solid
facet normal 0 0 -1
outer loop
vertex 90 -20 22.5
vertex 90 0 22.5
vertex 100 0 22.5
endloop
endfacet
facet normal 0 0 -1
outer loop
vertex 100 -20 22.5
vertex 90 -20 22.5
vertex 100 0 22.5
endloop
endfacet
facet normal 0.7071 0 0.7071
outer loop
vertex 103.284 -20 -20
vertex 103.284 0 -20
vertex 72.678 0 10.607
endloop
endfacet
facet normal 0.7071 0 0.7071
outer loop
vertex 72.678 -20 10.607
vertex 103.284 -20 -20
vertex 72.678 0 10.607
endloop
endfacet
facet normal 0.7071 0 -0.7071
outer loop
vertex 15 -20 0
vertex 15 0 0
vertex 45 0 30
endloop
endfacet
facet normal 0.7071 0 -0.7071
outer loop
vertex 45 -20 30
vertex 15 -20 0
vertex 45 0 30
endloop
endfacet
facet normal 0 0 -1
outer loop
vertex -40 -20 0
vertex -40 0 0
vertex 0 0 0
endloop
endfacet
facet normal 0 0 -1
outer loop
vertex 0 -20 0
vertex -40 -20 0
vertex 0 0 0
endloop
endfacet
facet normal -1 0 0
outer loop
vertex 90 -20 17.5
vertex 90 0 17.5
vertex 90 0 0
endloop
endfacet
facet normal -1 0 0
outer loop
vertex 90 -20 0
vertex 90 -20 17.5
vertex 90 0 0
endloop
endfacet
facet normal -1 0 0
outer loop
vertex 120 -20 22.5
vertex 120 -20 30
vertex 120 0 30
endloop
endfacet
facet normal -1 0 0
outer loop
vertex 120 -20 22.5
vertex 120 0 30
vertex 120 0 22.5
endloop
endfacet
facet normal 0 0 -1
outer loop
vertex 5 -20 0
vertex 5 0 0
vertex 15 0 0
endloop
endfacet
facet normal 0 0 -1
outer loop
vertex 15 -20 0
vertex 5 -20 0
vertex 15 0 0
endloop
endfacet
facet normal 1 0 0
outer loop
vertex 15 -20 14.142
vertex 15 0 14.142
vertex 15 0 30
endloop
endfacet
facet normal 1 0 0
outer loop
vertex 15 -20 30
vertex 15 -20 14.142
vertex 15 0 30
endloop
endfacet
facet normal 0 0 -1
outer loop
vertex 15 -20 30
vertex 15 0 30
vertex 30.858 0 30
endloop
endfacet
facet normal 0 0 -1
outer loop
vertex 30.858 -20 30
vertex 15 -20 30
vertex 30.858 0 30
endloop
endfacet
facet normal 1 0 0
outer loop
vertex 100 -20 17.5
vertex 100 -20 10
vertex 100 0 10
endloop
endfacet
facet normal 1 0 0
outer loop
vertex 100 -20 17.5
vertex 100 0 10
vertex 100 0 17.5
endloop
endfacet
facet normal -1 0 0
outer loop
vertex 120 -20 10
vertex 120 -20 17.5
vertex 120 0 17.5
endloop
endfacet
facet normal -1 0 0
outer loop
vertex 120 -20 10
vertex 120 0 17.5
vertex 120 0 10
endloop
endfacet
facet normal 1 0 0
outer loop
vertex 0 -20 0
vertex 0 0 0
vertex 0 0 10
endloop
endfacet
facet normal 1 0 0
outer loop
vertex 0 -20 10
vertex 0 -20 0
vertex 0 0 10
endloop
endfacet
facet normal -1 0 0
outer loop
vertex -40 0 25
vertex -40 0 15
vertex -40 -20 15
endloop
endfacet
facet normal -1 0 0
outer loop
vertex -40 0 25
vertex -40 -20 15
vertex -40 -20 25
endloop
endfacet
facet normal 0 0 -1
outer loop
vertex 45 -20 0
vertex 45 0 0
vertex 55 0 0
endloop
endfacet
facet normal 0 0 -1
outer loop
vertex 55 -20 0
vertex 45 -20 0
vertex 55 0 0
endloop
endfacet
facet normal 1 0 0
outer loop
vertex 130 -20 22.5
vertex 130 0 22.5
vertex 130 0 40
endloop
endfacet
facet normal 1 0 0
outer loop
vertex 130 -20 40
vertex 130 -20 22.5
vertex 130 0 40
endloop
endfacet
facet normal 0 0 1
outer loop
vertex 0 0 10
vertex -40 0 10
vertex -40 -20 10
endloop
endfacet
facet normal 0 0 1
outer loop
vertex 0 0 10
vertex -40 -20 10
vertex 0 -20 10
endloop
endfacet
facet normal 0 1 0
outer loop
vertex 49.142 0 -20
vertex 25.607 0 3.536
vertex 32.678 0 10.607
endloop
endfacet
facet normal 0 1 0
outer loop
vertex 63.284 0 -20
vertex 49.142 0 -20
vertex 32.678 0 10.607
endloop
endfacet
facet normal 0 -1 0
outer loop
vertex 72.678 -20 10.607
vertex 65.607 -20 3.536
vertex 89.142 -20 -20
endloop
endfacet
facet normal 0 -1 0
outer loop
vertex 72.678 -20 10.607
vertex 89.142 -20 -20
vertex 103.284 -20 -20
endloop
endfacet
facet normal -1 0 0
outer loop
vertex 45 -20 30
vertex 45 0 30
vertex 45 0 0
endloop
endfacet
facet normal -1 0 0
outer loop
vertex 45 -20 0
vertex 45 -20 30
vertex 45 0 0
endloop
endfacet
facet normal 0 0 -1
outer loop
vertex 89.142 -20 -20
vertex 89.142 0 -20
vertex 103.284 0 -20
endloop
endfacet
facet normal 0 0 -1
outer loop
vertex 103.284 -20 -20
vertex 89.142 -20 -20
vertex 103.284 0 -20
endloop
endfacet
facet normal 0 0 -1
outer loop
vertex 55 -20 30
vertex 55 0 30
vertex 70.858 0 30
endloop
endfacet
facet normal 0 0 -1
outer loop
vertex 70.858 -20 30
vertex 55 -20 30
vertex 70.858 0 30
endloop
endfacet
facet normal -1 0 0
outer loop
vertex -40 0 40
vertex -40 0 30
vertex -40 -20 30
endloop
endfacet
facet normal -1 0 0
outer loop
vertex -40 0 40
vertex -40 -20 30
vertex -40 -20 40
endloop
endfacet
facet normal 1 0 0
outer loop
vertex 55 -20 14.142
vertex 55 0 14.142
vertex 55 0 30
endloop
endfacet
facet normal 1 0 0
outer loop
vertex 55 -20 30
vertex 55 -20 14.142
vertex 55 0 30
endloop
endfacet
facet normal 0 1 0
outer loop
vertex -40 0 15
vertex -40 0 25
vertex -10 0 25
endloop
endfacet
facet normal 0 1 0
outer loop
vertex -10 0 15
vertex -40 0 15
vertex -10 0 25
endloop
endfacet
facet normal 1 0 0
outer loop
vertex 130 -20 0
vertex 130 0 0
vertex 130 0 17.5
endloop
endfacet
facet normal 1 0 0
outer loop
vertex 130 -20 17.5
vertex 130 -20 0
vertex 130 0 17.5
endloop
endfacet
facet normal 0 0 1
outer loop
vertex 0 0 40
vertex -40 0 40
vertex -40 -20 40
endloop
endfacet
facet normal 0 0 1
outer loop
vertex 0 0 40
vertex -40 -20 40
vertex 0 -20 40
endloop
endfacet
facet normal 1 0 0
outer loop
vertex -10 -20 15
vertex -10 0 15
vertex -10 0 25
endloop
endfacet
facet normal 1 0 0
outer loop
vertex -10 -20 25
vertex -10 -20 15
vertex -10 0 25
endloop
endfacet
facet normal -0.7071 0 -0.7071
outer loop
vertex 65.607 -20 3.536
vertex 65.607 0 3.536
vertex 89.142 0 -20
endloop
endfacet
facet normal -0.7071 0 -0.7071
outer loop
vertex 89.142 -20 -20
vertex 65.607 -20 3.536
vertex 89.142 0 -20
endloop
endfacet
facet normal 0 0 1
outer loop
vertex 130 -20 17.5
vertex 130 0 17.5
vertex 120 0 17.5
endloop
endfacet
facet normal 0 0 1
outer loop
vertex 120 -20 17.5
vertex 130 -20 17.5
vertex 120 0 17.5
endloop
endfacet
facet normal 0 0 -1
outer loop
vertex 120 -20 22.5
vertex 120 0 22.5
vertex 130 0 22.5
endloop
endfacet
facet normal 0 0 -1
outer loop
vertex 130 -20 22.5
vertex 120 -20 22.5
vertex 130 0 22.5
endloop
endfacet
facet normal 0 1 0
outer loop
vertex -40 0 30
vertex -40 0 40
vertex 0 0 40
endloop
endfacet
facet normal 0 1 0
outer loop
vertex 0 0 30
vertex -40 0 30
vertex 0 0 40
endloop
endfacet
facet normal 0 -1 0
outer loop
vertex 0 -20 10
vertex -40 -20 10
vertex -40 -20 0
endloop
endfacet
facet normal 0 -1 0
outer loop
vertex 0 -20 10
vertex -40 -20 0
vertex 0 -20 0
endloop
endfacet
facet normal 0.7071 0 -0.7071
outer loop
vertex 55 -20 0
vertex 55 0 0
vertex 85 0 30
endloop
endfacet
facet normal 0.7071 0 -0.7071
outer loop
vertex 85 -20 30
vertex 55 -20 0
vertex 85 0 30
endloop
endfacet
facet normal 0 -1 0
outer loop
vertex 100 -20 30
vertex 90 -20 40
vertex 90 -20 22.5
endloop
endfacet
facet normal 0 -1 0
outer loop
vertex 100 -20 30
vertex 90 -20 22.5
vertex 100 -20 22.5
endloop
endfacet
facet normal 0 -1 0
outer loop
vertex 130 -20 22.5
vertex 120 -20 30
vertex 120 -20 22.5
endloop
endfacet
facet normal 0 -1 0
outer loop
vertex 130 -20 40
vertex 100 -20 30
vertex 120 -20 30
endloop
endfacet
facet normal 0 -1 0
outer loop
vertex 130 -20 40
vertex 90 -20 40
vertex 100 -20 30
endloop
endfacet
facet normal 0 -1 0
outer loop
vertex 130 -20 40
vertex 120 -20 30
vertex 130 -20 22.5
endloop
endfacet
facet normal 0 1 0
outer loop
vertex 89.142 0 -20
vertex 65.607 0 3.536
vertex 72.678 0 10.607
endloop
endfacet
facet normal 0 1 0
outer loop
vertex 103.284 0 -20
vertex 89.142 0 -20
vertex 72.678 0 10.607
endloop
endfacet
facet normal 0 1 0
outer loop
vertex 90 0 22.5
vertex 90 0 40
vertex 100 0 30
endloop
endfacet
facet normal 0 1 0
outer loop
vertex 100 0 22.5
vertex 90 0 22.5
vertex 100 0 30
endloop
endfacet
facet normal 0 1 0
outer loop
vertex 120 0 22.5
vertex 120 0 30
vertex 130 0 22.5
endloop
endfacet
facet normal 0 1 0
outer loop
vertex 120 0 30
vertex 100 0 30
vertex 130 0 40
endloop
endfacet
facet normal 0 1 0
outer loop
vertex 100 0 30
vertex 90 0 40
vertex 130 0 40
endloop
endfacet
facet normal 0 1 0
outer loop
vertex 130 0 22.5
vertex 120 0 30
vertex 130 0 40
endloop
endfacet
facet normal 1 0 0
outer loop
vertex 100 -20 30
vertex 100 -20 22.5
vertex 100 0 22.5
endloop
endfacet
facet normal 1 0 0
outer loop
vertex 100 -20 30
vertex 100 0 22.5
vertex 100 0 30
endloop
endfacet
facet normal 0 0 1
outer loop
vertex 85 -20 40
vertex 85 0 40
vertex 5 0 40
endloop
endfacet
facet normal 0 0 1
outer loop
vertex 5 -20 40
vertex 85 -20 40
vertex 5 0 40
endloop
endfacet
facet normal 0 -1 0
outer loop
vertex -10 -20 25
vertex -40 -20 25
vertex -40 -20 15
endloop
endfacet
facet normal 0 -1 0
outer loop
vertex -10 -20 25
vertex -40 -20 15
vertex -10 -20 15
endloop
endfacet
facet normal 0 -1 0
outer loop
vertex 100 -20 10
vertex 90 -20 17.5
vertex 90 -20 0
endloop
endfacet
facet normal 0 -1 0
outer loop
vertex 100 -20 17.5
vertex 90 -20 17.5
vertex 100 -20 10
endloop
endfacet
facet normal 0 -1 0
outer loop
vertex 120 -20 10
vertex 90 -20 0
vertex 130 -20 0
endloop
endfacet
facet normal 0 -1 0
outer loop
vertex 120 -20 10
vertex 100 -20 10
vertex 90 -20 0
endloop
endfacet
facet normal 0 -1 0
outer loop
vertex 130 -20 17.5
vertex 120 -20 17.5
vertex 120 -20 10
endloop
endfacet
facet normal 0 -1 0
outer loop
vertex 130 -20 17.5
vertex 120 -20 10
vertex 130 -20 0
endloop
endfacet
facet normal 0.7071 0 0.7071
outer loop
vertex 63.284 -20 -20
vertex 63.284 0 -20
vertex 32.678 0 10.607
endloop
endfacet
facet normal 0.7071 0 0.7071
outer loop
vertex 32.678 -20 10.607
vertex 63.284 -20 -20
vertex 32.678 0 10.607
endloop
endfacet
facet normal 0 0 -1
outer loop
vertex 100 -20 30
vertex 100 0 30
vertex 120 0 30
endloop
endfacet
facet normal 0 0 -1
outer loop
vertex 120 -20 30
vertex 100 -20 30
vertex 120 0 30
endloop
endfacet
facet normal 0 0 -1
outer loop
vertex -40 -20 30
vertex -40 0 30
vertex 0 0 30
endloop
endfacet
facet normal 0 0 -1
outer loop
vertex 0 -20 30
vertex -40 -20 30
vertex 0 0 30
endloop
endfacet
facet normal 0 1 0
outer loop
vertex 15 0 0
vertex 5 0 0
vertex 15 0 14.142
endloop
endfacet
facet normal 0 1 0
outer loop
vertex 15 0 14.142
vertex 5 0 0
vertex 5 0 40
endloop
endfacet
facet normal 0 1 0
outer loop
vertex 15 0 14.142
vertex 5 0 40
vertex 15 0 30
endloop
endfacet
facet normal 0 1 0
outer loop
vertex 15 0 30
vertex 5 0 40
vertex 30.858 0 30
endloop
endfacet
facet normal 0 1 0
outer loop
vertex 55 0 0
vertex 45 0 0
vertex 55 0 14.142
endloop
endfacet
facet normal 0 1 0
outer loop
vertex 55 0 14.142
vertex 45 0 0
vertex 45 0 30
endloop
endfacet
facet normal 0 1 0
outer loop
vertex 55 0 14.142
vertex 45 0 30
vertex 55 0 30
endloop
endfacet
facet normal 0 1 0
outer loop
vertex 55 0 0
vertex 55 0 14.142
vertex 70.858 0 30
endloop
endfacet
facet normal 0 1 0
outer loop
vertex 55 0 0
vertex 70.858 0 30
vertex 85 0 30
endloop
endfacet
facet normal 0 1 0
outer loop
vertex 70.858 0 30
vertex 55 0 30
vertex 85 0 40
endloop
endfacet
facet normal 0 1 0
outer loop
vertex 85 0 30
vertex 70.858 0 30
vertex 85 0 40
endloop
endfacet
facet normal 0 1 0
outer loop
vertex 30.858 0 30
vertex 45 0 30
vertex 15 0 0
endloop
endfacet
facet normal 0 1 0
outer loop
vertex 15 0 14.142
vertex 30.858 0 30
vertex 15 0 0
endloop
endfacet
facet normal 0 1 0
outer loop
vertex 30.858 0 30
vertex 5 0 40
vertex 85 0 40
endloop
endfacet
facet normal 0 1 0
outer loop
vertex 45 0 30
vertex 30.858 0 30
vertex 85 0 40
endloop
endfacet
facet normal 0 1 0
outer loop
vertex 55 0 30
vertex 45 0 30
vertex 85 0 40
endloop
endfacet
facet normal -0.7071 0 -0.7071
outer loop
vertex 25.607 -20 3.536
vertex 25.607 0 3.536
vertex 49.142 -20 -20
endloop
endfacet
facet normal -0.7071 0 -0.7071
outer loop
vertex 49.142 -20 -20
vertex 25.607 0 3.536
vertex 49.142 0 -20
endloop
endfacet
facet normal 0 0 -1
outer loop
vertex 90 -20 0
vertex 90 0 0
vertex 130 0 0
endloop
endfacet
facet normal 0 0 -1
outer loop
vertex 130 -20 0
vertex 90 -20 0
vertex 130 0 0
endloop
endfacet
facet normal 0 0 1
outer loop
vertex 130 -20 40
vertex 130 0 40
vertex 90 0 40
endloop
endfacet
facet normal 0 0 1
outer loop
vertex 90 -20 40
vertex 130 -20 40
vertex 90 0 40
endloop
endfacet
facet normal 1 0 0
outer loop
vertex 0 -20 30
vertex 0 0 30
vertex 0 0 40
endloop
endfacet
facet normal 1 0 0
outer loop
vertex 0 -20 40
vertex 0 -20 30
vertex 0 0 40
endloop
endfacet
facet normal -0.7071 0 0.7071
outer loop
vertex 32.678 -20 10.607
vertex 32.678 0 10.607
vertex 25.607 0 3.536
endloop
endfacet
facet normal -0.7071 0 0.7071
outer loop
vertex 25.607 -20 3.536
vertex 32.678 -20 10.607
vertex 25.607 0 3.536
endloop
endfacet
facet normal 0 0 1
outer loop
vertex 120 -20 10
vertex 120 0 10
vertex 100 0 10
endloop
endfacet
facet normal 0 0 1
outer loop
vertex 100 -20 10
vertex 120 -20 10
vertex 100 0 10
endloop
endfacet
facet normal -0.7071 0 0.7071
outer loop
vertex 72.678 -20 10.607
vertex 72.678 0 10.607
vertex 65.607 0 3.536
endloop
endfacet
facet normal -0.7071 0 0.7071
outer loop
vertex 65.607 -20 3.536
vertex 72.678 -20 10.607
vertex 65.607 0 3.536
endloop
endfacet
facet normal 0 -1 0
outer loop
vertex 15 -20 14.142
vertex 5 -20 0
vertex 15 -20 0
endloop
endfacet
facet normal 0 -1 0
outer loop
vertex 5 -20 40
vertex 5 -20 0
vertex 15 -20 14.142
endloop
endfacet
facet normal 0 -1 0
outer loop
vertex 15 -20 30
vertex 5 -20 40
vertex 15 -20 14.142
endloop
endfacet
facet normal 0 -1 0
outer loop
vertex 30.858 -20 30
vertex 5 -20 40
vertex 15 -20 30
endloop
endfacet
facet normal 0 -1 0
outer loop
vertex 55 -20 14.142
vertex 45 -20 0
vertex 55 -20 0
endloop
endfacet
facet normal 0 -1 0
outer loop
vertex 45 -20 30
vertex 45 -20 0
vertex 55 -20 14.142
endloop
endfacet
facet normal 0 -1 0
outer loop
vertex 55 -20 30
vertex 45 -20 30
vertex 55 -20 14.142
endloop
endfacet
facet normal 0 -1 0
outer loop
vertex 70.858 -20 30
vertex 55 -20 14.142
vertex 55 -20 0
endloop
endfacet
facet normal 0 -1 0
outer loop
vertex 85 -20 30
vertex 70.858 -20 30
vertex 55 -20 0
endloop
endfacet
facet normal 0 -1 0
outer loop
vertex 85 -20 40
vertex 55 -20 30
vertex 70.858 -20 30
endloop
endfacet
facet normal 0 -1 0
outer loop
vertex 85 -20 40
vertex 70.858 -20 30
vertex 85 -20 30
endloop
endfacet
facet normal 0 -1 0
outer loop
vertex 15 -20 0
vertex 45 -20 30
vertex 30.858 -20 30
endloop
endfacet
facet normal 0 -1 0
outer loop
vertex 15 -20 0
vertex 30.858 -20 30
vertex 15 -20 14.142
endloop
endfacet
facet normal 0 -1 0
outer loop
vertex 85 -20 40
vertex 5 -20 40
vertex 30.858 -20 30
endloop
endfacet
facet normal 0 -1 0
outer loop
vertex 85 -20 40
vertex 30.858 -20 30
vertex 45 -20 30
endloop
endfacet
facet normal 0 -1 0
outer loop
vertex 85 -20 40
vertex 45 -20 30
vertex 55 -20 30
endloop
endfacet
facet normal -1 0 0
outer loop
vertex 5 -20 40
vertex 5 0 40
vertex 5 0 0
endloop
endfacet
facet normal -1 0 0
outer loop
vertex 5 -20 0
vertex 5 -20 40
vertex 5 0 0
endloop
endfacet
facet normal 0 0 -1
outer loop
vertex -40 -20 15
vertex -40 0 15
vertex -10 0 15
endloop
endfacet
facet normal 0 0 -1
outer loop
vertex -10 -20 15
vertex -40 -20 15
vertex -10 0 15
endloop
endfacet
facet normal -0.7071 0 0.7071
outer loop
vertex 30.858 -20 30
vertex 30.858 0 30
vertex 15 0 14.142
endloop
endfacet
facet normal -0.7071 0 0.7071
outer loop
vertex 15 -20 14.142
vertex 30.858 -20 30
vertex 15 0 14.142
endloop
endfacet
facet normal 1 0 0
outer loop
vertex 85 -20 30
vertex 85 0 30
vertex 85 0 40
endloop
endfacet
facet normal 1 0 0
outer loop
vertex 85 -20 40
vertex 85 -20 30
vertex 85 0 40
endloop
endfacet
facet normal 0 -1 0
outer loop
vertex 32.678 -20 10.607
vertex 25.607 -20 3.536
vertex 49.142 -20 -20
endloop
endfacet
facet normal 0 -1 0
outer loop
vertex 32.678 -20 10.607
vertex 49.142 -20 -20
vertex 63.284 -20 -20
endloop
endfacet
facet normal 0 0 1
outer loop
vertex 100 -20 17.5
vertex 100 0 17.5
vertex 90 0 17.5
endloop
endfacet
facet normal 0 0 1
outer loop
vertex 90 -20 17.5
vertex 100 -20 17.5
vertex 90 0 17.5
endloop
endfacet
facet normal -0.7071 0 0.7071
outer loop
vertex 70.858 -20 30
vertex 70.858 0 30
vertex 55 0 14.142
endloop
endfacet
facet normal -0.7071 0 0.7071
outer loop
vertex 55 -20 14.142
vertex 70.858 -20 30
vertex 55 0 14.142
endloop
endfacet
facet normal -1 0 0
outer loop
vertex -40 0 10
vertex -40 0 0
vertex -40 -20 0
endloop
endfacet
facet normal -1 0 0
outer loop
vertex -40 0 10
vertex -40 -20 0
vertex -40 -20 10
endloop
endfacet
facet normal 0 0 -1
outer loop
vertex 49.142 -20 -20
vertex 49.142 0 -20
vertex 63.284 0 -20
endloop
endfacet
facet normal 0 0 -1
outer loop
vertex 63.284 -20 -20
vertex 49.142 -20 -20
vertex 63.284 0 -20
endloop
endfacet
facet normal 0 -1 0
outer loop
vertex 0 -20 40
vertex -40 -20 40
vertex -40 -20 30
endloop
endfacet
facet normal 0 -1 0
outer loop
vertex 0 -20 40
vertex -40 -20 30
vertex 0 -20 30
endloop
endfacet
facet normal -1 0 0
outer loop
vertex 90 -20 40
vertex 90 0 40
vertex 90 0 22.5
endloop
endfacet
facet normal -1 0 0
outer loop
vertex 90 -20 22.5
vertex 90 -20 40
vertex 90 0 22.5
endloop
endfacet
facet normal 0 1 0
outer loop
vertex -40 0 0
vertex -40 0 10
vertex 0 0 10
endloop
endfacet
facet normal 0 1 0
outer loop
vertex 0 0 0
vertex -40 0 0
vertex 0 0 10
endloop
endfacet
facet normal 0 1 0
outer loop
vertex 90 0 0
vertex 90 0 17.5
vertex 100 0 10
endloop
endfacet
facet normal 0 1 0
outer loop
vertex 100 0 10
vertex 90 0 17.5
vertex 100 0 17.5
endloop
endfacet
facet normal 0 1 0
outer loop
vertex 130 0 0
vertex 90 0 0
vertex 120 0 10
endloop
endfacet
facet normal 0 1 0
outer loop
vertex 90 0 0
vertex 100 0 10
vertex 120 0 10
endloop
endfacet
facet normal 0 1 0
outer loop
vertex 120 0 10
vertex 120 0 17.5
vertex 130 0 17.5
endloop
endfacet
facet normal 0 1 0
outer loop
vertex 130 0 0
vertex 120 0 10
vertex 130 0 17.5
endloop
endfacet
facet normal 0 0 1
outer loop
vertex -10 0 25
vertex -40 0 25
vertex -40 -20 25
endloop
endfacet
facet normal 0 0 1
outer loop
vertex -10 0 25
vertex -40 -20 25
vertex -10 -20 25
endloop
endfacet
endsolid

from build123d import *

# Parameters (mm, degrees)
F0_W     = 30
F0_H     = 10
F0_W_2   = 40
F1_DEPTH = 20


with BuildPart() as f1:
    # F0 (on Front) → F1 (new body)
    with BuildSketch(Plane.XZ):
        with Locations((-25, 20)):
            Rectangle(F0_W, F0_H)
        with Locations((-20, 35)):
            Rectangle(F0_W_2, F0_H)
        with Locations((-20, 5)):
            Rectangle(F0_W_2, F0_H)
        Polygon((5, 40), (5, 0), (15, 0), (22.071068, 7.071068), (29.142136, 14.142136), (45, 30), (45, 40), align=None)
        Polygon((15, 14.142136), (15, 30), (30.857864, 30), align=None, mode=Mode.SUBTRACT)
        Polygon((32.67767, 10.606602), (25.606602, 3.535534), (49.142136, -20), (63.284271, -20), align=None)
        Polygon((72.67767, 10.606602), (65.606602, 3.535534), (89.142136, -20), (103.284271, -20), align=None)
        Polygon((85, 40), (45, 40), (45, 30), (45, 0), (55, 0), (62.071068, 7.071068), (69.142136, 14.142136), (85, 30), align=None)
        Polygon((55, 14.142136), (55, 30), (70.857864, 30), align=None, mode=Mode.SUBTRACT)
        Polygon((130, 40), (90, 40), (90, 22.5), (100, 22.5), (100, 30), (120, 30), (120, 22.5), (130, 22.5), align=None)
        Polygon((90, 17.5), (90, 0), (130, 0), (130, 17.5), (120, 17.5), (120, 10), (100, 10), (100, 17.5), align=None)
    extrude(amount=F1_DEPTH)


solid = f1.part
